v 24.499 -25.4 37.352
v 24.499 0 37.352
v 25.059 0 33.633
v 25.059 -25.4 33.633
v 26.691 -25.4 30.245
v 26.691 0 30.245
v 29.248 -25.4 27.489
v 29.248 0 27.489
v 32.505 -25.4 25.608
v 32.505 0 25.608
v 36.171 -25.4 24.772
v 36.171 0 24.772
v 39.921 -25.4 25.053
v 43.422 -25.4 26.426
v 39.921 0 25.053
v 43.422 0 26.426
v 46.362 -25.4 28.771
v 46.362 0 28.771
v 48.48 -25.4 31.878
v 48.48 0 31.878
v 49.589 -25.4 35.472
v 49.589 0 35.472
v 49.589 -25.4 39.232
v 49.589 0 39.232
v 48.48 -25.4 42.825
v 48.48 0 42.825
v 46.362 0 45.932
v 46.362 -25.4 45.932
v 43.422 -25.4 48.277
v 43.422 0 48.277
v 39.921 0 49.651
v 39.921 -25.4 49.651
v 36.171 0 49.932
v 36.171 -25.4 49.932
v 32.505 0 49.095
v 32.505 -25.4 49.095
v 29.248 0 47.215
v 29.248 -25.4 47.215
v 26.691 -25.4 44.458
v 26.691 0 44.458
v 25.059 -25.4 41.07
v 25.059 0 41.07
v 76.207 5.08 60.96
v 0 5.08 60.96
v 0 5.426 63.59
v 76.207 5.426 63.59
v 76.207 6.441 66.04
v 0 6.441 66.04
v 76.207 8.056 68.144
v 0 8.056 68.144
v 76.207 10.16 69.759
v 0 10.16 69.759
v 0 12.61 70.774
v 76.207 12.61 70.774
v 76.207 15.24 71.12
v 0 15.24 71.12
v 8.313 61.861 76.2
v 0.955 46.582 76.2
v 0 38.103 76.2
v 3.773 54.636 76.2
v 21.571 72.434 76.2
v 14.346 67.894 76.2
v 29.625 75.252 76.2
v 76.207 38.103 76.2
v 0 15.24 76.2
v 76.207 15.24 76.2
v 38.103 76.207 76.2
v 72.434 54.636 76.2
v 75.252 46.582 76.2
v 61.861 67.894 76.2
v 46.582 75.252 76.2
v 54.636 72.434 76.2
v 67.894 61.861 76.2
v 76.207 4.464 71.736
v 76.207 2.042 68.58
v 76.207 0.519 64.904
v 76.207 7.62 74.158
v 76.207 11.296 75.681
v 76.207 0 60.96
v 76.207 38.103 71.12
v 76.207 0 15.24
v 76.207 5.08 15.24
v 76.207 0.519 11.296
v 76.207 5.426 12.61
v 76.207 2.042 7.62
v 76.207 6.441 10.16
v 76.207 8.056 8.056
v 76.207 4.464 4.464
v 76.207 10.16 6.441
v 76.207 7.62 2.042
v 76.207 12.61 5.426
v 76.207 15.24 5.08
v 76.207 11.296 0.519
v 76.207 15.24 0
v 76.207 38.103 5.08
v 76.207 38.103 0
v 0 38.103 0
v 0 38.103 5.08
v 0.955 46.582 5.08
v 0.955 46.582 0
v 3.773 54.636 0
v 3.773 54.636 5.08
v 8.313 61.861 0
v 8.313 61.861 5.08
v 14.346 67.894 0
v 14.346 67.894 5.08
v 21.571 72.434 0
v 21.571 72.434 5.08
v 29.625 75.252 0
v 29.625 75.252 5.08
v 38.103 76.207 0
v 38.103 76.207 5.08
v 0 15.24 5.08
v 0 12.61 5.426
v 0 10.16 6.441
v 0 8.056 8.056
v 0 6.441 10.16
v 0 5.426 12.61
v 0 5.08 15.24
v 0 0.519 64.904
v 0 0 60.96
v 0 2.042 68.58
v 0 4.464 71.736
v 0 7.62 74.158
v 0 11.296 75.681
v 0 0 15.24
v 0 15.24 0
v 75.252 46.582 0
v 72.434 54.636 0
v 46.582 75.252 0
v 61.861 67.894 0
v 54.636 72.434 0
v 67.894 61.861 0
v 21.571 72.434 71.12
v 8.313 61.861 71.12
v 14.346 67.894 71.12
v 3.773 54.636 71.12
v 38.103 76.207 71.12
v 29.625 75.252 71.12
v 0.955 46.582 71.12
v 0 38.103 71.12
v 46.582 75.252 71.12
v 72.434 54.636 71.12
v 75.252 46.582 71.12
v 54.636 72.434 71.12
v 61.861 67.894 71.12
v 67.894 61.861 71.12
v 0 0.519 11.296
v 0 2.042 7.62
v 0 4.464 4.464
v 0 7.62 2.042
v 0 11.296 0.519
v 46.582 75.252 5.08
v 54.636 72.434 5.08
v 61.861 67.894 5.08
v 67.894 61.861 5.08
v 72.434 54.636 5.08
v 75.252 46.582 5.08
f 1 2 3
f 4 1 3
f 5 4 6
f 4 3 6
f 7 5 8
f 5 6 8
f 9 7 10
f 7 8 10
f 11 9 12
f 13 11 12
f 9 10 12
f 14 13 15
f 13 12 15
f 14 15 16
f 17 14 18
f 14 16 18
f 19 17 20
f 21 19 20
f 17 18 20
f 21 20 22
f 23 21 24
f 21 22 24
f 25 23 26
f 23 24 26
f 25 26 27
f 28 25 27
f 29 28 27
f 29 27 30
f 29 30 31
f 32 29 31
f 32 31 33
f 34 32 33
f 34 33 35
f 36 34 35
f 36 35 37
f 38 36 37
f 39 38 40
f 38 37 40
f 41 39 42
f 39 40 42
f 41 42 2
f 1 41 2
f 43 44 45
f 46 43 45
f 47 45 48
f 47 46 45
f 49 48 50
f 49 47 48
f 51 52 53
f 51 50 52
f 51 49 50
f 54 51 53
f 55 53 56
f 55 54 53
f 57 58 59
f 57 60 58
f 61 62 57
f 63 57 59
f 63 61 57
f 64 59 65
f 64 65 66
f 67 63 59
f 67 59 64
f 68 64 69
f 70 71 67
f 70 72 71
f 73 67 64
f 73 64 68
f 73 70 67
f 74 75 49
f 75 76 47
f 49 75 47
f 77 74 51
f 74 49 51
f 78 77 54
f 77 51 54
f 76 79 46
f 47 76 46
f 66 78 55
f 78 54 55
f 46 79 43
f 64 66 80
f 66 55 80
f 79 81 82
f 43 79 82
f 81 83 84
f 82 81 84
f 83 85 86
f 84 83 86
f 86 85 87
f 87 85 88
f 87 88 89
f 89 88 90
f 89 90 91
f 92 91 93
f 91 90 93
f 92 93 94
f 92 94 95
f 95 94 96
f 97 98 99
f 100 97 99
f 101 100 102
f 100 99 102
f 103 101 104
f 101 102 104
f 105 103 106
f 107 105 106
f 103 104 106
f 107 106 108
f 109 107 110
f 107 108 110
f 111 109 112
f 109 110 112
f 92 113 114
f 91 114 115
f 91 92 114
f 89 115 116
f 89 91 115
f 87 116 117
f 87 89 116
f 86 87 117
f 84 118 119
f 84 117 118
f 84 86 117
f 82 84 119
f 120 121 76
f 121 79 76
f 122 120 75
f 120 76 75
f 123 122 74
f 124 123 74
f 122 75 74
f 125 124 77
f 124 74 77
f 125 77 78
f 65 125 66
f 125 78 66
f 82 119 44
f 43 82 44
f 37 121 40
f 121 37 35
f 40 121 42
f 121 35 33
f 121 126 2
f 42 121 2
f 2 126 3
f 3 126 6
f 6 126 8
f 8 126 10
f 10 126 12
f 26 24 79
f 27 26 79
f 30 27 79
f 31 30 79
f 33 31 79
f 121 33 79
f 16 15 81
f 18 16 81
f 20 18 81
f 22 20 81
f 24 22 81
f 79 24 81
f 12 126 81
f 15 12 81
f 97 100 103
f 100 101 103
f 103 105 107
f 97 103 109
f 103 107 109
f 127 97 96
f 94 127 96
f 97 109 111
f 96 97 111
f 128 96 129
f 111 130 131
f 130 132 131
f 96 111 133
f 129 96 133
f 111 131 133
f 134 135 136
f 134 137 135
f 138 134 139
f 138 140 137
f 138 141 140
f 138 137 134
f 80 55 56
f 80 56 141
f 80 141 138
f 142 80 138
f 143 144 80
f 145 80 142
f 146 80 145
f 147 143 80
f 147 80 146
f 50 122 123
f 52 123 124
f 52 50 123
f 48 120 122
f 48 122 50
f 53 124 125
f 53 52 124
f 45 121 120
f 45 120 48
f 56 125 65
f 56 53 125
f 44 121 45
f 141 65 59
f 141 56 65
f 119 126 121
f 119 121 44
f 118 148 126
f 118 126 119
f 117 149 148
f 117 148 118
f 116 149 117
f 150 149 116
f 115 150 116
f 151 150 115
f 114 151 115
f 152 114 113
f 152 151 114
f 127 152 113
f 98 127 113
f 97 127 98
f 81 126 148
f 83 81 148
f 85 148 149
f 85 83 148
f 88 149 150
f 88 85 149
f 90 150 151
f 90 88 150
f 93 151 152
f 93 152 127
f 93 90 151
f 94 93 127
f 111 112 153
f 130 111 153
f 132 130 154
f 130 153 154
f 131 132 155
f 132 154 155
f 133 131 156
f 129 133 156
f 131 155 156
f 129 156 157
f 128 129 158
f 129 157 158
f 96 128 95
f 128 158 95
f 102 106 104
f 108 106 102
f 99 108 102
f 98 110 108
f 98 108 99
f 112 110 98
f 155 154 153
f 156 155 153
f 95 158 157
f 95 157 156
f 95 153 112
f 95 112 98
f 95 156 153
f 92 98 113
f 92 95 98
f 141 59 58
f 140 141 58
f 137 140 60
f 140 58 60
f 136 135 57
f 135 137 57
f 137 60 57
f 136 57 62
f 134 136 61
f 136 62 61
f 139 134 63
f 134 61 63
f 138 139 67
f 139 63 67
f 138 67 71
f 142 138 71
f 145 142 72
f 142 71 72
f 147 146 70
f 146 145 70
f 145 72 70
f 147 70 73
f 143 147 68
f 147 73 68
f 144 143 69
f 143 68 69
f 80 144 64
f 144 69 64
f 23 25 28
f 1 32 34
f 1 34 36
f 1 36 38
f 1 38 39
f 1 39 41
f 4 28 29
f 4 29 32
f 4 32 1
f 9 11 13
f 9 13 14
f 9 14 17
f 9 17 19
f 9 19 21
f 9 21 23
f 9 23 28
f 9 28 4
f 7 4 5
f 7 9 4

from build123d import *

# Parameters (mm, degrees)
SKETCH1_W           = 76.206980413
SKETCH1_H           = 76.206980413
BOSS_EXTRUDE1_DEPTH = 76.2
FILLET1_R           = 15.24
FILLET4_R           = 38.10349
CUT_EXTRUDE1_DEPTH  = 207.518
SKETCH4_R           = 12.615490026
BOSS_EXTRUDE2_DEPTH = 25.4


with BuildPart() as part:
    # Sketch1 → Boss-Extrude1 (new body)
    with BuildSketch(Plane.XY):
        with Locations((38.103490207, 38.103490207)):
            Rectangle(SKETCH1_W, SKETCH1_H)
    extrude(amount=BOSS_EXTRUDE1_DEPTH)

    # Fillet1
    fillet1_edges = [part.edges().sort_by_distance(p)[0] for p in [
        (38.103490206, 0, 76.2),
        (38.103490206, 0, 0),
    ]]
    fillet(fillet1_edges, radius=FILLET1_R)

    # Fillet4
    fillet4_edges = [part.edges().sort_by_distance(p)[0] for p in [
        (76.206980413, 76.206980413, 38.1),
        (0, 76.206980413, 38.1),
    ]]
    fillet(fillet4_edges, radius=FILLET4_R)

    # Sketch3 → Cut-Extrude1 (cut)
    with BuildSketch(Plane(origin=(76.206980413, 0, 0), x_dir=(0, 0, -1), z_dir=(1, 0, 0))):
        with BuildLine():
            Line((-71.12, 76.206980413), (-5.08, 76.206980413))
            Line((-5.08, 76.206980413), (-5.08, 38.103490206))
            Line((-5.08, 38.103490206), (-5.08, 15.24))
            ThreePointArc((-5.08, 15.24), (-8.055795103, 8.055795103), (-15.24, 5.08))
            Line((-15.24, 5.08), (-60.96, 5.08))
            ThreePointArc((-60.96, 5.08), (-68.144204897, 8.055795103), (-71.12, 15.24))
            Line((-71.12, 15.24), (-71.12, 38.103490206))
            Line((-71.12, 38.103490206), (-71.12, 76.206980413))
        make_face()
    extrude(amount=-CUT_EXTRUDE1_DEPTH, mode=Mode.SUBTRACT)

    # Sketch4 → Boss-Extrude2 (add)
    with BuildSketch(Plane(origin=(0, 0, 0), x_dir=(-1, 0, 0), z_dir=(0, -1, 0))):
        with Locations((-37.114040008, -37.351744978)):
            Circle(SKETCH4_R)
    extrude(amount=BOSS_EXTRUDE2_DEPTH)


solid = part.part
